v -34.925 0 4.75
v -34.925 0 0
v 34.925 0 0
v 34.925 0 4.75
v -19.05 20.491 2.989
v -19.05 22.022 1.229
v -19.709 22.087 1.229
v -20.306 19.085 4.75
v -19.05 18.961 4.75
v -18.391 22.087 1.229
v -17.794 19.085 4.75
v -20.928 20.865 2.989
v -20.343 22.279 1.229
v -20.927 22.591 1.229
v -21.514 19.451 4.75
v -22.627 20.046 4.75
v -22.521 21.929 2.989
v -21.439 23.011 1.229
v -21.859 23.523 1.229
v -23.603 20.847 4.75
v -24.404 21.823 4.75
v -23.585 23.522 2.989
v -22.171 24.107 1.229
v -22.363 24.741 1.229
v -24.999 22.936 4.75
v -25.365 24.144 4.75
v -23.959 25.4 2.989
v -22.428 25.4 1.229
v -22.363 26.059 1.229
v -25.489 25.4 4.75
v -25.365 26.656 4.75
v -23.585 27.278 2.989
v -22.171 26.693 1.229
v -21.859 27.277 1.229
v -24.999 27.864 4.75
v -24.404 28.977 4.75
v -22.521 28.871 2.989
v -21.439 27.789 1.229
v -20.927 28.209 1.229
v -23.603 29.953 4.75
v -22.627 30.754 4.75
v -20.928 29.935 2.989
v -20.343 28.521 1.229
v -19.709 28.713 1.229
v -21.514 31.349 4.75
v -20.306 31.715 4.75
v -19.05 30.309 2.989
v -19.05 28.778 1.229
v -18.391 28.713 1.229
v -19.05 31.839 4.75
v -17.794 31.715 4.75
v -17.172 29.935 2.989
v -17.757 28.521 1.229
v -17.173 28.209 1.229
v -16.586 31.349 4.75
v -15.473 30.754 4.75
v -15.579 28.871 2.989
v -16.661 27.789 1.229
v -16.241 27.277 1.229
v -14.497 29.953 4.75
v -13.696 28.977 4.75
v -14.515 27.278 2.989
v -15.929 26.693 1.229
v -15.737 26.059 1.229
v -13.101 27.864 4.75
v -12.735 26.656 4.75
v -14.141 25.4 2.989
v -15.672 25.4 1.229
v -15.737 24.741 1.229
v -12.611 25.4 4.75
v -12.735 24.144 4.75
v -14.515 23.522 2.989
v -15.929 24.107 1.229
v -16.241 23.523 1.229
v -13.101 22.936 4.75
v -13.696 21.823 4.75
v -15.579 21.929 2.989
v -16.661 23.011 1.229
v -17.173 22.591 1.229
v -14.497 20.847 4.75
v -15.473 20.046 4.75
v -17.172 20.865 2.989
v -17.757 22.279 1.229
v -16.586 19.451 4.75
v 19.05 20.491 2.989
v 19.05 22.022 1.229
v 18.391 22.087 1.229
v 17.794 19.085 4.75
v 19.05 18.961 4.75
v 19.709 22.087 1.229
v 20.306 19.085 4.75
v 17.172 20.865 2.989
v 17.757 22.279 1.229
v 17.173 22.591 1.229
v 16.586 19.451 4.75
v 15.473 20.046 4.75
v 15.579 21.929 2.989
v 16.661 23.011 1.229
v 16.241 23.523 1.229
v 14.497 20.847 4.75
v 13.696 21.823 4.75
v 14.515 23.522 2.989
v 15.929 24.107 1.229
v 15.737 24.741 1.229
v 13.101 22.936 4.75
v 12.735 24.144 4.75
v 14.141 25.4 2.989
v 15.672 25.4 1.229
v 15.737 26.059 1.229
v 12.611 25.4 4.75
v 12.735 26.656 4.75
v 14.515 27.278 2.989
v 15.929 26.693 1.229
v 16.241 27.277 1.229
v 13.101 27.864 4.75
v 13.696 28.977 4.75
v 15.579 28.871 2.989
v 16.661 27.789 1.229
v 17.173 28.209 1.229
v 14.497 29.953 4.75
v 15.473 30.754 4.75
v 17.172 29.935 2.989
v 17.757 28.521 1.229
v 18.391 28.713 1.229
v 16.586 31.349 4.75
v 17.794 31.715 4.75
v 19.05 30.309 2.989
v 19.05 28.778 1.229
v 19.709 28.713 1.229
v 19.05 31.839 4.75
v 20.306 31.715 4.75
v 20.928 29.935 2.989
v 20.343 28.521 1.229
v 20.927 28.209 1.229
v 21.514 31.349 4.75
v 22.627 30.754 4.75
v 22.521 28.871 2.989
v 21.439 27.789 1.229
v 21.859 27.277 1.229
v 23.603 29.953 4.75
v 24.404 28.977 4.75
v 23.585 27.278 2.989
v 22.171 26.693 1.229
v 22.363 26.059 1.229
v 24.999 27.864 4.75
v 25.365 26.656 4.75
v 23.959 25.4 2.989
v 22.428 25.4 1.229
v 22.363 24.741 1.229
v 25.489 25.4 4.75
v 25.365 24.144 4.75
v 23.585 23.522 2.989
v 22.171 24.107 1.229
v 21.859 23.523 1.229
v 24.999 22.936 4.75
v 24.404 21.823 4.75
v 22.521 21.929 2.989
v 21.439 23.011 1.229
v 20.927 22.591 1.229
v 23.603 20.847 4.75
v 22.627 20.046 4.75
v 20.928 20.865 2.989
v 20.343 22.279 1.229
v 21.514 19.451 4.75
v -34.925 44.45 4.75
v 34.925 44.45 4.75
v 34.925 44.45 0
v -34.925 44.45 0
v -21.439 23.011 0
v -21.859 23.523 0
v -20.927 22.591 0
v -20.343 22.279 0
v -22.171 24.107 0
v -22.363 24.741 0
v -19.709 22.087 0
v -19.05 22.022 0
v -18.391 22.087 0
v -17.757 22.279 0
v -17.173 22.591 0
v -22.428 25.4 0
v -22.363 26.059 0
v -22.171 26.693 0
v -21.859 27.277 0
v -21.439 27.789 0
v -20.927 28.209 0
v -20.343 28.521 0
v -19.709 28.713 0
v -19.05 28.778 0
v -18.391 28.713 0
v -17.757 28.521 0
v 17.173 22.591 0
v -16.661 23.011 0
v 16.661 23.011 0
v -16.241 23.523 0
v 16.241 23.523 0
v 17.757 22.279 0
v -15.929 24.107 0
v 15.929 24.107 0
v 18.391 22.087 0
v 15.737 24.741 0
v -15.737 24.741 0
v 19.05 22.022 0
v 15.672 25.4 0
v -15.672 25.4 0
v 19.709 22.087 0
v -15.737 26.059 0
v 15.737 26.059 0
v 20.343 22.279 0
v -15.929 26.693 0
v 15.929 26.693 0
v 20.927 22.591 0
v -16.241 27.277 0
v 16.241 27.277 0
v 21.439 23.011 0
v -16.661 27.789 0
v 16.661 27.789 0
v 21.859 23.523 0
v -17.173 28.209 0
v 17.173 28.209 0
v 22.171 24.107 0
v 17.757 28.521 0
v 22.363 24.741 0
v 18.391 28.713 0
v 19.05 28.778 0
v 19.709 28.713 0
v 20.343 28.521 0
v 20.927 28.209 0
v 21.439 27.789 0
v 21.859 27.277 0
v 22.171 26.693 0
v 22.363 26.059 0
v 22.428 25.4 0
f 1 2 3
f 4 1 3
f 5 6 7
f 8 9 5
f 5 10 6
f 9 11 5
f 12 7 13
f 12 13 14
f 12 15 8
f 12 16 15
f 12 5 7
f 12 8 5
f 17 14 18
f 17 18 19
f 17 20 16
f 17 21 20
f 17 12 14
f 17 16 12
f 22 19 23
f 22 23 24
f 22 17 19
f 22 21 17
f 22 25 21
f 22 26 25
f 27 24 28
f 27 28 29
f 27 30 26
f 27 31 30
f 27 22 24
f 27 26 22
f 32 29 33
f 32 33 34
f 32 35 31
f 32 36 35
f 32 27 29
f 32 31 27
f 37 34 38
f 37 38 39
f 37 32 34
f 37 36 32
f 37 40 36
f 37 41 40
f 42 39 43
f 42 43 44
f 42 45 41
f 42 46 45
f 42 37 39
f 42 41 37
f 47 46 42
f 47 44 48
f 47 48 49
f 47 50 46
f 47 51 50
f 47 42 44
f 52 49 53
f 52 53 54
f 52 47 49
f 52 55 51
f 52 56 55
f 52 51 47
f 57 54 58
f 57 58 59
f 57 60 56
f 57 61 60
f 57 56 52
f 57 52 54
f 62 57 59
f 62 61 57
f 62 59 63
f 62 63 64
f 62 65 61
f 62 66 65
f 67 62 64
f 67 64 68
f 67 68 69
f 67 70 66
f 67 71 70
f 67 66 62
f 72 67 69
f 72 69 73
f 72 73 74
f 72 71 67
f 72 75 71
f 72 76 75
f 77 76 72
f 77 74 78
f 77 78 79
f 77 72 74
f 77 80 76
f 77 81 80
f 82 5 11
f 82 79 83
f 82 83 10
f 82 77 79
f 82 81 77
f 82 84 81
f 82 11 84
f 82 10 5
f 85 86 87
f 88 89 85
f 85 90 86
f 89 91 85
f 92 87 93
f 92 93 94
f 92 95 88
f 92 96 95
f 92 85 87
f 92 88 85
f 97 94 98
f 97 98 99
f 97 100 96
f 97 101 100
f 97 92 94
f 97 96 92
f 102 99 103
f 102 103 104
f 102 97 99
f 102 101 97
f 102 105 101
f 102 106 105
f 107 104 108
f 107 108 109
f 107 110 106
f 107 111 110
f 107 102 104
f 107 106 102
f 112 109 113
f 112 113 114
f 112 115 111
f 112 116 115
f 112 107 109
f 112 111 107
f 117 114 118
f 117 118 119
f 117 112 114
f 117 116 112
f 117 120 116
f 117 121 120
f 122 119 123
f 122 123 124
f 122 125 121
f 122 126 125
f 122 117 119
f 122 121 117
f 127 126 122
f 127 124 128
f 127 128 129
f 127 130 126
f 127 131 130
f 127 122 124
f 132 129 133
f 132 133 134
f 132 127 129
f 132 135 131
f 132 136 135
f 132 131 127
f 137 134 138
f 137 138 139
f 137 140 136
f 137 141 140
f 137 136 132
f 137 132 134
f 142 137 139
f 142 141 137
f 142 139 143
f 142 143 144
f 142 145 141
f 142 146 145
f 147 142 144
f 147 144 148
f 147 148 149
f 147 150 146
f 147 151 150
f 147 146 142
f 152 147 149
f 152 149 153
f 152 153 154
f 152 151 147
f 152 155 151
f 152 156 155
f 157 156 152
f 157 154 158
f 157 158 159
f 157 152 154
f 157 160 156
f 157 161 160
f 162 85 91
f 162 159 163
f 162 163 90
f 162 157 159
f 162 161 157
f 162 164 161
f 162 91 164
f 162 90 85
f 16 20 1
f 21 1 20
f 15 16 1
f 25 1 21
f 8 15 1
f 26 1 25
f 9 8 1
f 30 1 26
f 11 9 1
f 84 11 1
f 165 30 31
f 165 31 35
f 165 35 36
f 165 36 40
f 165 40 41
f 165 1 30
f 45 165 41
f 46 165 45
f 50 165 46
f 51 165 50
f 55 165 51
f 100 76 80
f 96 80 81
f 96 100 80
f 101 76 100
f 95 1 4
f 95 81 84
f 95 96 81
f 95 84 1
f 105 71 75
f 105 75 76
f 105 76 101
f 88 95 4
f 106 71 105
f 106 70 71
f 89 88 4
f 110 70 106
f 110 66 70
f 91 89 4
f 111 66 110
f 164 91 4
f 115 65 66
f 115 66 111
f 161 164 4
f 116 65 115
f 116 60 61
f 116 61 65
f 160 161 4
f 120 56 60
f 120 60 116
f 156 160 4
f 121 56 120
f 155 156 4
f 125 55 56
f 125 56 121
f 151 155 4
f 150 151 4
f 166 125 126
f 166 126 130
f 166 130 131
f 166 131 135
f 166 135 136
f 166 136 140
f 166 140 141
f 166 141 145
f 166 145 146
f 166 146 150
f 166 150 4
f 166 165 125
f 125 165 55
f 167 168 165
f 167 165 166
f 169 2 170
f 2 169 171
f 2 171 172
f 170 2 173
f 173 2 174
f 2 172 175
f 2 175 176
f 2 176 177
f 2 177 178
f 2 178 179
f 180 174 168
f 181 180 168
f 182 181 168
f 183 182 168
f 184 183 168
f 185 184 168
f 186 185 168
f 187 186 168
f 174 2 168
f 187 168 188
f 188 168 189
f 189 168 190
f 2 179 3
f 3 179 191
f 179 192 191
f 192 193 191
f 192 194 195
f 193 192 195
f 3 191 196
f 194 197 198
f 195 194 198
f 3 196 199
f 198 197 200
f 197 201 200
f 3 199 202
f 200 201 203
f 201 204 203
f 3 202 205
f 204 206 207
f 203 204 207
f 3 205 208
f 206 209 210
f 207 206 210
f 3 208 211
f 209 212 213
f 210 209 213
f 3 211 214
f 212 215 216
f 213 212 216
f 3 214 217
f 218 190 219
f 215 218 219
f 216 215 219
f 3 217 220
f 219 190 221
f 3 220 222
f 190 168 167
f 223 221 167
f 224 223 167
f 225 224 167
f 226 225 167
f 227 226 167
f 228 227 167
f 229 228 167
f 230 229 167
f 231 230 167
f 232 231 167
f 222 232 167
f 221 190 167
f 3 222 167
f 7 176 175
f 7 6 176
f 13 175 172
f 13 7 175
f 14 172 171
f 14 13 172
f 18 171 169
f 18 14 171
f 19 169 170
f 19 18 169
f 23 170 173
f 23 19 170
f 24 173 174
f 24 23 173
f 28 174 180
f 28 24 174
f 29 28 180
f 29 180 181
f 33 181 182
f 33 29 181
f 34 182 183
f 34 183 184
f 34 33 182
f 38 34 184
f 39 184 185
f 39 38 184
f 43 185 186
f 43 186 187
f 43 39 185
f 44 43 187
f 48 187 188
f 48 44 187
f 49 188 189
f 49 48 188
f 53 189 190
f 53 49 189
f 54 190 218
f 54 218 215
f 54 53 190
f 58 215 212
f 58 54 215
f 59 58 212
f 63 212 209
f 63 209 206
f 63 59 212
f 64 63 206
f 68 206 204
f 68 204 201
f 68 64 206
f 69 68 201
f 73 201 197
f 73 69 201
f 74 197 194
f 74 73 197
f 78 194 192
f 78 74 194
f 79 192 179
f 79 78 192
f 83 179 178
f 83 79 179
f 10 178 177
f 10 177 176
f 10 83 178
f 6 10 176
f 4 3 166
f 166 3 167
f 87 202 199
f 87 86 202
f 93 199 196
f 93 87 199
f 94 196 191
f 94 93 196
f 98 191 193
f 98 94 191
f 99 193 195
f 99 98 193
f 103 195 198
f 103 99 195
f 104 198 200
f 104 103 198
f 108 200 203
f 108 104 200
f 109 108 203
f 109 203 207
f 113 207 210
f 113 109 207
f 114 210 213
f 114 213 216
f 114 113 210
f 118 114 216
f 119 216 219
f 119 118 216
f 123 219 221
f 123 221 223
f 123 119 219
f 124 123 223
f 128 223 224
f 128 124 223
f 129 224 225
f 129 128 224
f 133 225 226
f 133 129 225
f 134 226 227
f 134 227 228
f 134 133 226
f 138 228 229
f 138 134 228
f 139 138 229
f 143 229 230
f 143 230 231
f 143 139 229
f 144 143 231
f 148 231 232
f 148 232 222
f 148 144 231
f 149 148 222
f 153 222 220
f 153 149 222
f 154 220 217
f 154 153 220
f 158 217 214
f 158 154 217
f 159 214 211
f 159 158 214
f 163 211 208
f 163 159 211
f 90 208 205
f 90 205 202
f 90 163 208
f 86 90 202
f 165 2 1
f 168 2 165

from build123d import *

# Parameters (mm, degrees)
SKETCH1_W                                     = 69.85
SKETCH1_H                                     = 44.45
BOSS_EXTRUDE1_DEPTH                           = 4.7498
CSK_FOR_1_4_FLAT_HEAD_MACHINE_SCREW1_AT_COUNT = 2
CSK_FOR_1_4_FLAT_HEAD_MACHINE_SCREW1_AT_PITCH = 38.1


with BuildPart() as part:
    # Sketch1 → Boss-Extrude1 (new body)
    with BuildSketch(Plane.XY):
        with Locations((0, 22.225)):
            Rectangle(SKETCH1_W, SKETCH1_H)
    extrude(amount=BOSS_EXTRUDE1_DEPTH)

    # Sketch3 → CSK for 1/4 Flat Head Machine Screw1 (revolve, cut)
    with BuildSketch(Plane(origin=(19.05, 25.4, 4.7498), x_dir=(0, -1, 0), z_dir=(1, 0, 0))):
        Polygon((0, 0), (0, 4.7498), (3.3782, 4.7498), (3.3782, 3.520932584), (6.4389, 0), align=None)
    csk_for_1_4_flat_head_machine_screw1 = revolve(axis=Axis((19.05, 25.4, 11.0998), (0, 0, -1)), mode=Mode.SUBTRACT)

    # CSK for 1/4 Flat Head Machine Screw1 at: CSK for 1/4 Flat Head Machine Screw1 ×2
    with Locations(*[(-i * CSK_FOR_1_4_FLAT_HEAD_MACHINE_SCREW1_AT_PITCH, 0, 0) for i in range(1, CSK_FOR_1_4_FLAT_HEAD_MACHINE_SCREW1_AT_COUNT)]):
        add(csk_for_1_4_flat_head_machine_screw1, mode=Mode.SUBTRACT)


solid = part.part
